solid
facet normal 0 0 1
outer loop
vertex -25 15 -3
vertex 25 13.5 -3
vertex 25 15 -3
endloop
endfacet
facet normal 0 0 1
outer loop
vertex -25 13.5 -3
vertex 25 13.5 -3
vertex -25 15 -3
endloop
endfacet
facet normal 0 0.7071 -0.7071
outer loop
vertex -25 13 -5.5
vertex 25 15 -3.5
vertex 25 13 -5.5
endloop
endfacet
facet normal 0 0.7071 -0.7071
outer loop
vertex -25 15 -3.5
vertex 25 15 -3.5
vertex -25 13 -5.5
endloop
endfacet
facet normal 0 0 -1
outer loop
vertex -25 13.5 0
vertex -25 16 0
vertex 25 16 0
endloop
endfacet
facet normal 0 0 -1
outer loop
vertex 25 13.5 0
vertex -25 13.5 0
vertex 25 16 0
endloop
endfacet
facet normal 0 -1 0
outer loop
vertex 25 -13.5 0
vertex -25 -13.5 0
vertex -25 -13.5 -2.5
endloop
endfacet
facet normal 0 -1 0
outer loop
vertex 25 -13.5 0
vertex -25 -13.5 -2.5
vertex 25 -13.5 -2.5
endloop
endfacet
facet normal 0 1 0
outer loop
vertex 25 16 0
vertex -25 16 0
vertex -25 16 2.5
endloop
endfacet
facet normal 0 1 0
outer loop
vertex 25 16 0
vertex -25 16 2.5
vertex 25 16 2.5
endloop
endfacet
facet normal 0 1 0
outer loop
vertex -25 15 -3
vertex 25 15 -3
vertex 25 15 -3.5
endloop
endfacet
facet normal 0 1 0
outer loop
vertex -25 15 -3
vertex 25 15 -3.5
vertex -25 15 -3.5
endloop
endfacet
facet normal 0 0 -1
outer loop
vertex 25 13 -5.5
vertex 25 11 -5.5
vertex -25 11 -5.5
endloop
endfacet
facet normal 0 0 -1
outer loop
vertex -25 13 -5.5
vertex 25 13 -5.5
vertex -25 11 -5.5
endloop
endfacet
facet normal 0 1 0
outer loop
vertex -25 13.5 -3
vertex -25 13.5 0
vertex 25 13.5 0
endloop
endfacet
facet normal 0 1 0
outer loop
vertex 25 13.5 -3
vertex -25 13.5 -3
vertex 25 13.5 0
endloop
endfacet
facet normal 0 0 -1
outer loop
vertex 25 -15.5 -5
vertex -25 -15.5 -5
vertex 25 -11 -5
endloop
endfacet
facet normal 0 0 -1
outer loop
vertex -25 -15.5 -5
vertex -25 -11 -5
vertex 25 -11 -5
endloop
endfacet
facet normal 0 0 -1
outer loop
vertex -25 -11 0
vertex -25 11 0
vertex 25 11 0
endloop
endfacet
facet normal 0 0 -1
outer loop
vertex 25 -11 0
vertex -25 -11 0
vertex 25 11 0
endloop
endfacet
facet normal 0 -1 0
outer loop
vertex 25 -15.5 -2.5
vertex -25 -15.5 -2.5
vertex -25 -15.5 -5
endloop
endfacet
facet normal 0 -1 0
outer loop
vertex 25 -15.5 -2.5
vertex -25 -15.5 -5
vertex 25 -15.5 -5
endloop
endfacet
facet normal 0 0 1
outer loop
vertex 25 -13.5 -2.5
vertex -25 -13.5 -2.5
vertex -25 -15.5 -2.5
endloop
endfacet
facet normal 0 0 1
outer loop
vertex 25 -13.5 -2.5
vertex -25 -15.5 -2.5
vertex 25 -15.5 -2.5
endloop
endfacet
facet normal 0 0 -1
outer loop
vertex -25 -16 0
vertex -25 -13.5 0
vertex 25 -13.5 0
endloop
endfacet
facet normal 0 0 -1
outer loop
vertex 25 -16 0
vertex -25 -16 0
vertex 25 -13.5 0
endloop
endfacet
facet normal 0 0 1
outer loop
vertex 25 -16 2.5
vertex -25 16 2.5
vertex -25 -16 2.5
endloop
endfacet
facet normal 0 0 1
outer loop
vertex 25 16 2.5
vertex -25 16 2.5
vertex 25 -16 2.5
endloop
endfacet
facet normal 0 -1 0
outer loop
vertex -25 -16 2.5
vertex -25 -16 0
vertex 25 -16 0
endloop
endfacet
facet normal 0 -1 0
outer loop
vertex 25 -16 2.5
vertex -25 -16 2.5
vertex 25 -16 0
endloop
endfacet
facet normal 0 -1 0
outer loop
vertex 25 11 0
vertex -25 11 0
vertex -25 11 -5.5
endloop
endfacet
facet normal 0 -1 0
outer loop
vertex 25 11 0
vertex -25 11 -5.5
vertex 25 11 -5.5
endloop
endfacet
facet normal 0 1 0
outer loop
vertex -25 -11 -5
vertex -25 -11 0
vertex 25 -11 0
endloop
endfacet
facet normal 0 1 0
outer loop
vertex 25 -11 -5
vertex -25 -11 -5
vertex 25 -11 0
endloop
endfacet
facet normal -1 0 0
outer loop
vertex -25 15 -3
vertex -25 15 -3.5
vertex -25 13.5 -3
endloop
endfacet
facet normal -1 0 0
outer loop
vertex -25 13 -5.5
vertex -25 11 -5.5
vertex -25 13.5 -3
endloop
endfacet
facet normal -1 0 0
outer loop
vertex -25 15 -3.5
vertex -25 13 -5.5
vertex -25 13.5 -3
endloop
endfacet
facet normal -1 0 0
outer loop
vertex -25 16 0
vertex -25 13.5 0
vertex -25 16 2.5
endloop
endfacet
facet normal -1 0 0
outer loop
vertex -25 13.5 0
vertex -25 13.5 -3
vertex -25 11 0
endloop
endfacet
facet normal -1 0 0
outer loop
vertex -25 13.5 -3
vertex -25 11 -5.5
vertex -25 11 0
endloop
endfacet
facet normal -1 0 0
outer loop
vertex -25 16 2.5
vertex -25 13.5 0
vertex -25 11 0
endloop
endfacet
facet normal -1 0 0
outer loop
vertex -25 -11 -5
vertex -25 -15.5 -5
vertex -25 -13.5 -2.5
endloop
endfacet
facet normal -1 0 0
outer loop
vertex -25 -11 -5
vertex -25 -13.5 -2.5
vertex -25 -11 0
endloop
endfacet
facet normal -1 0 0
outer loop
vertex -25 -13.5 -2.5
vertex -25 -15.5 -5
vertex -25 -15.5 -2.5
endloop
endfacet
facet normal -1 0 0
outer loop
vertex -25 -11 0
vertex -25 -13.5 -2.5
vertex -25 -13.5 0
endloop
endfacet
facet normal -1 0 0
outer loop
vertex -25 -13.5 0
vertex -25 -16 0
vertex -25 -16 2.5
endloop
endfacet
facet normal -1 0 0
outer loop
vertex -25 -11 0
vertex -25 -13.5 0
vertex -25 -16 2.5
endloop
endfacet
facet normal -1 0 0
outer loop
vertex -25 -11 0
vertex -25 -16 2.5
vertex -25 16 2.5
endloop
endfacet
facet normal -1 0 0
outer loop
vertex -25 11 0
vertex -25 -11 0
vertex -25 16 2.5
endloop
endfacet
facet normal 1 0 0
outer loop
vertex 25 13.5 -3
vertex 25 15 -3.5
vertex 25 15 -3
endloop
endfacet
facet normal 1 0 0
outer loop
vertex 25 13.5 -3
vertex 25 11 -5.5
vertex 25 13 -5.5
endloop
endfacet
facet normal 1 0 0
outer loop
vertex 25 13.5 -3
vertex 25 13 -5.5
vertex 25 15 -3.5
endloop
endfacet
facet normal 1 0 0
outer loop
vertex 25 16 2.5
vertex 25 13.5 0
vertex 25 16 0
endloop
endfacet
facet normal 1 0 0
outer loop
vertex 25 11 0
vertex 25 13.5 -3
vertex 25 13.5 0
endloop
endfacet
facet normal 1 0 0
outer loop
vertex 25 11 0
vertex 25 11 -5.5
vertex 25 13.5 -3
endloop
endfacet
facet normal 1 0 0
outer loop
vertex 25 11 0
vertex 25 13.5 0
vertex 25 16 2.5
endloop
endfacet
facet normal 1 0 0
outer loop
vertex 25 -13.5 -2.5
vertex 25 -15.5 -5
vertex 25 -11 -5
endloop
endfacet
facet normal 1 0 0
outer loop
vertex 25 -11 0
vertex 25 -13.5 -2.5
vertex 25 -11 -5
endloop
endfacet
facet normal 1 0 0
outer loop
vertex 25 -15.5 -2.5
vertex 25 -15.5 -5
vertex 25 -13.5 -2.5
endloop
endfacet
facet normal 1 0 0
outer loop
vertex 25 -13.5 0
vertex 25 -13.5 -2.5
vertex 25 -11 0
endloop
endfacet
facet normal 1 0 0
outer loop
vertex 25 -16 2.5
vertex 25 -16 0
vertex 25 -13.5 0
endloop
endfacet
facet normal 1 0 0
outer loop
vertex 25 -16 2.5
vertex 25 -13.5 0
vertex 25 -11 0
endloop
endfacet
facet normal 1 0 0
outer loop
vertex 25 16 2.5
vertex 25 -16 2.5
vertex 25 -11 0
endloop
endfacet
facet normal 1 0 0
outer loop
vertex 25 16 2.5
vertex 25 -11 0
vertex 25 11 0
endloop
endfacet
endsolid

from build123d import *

# Parameters (mm, degrees)
F0_W     = 50
F0_H     = 2.5
F0_H_2   = 22
F1_DEPTH = 2.5
F2_DEPTH = 5
F3_W     = 50
F3_H     = 2.5
F4_DEPTH = 2
F5_DEPTH = 5.5
F6_W     = 50
F6_H     = 2.5
F7_DEPTH = 1.5
F8_SIZE  = 2


with BuildPart() as f1:
    # F0 (on Top) → F1 (new body)
    with BuildSketch(Plane.XY):
        with Locations((0, 14.75)):
            Rectangle(F0_W, F0_H)
        with Locations((0, 12.25)):
            Rectangle(F0_W, F0_H)
        Rectangle(F0_W, F0_H_2)
        with Locations((0, -12.25)):
            Rectangle(F0_W, F0_H)
        with Locations((0, -14.75)):
            Rectangle(F0_W, F0_H)
    extrude(amount=F1_DEPTH)

    # F0 (on Top) → F2 (join)
    with BuildSketch(Plane.XY):
        with Locations((0, -12.25)):
            Rectangle(F0_W, F0_H)
    extrude(amount=-F2_DEPTH)

    # F3 (on face) → F4 (join)
    with BuildSketch(Plane.XZ.offset(13.5)):
        with Locations((0, -3.75)):
            Rectangle(F3_W, F3_H)
    extrude(amount=F4_DEPTH)

    # F0 (on Top) → F5 (join)
    with BuildSketch(Plane.XY):
        with Locations((0, 12.25)):
            Rectangle(F0_W, F0_H)
    extrude(amount=-F5_DEPTH)

    # F6 (on face) → F7 (join)
    with BuildSketch(Plane(origin=(0, 13.5, 0), x_dir=(-1, 0, 0), z_dir=(0, 1, 0))):
        with Locations((0, -4.25)):
            Rectangle(F6_W, F6_H)
    extrude(amount=F7_DEPTH)

    # F8
    f8_edges = [f1.edges().sort_by_distance(p)[0] for p in [
        (0, 15, -5.5),
    ]]
    chamfer(f8_edges, length=F8_SIZE)


solid = f1.part
